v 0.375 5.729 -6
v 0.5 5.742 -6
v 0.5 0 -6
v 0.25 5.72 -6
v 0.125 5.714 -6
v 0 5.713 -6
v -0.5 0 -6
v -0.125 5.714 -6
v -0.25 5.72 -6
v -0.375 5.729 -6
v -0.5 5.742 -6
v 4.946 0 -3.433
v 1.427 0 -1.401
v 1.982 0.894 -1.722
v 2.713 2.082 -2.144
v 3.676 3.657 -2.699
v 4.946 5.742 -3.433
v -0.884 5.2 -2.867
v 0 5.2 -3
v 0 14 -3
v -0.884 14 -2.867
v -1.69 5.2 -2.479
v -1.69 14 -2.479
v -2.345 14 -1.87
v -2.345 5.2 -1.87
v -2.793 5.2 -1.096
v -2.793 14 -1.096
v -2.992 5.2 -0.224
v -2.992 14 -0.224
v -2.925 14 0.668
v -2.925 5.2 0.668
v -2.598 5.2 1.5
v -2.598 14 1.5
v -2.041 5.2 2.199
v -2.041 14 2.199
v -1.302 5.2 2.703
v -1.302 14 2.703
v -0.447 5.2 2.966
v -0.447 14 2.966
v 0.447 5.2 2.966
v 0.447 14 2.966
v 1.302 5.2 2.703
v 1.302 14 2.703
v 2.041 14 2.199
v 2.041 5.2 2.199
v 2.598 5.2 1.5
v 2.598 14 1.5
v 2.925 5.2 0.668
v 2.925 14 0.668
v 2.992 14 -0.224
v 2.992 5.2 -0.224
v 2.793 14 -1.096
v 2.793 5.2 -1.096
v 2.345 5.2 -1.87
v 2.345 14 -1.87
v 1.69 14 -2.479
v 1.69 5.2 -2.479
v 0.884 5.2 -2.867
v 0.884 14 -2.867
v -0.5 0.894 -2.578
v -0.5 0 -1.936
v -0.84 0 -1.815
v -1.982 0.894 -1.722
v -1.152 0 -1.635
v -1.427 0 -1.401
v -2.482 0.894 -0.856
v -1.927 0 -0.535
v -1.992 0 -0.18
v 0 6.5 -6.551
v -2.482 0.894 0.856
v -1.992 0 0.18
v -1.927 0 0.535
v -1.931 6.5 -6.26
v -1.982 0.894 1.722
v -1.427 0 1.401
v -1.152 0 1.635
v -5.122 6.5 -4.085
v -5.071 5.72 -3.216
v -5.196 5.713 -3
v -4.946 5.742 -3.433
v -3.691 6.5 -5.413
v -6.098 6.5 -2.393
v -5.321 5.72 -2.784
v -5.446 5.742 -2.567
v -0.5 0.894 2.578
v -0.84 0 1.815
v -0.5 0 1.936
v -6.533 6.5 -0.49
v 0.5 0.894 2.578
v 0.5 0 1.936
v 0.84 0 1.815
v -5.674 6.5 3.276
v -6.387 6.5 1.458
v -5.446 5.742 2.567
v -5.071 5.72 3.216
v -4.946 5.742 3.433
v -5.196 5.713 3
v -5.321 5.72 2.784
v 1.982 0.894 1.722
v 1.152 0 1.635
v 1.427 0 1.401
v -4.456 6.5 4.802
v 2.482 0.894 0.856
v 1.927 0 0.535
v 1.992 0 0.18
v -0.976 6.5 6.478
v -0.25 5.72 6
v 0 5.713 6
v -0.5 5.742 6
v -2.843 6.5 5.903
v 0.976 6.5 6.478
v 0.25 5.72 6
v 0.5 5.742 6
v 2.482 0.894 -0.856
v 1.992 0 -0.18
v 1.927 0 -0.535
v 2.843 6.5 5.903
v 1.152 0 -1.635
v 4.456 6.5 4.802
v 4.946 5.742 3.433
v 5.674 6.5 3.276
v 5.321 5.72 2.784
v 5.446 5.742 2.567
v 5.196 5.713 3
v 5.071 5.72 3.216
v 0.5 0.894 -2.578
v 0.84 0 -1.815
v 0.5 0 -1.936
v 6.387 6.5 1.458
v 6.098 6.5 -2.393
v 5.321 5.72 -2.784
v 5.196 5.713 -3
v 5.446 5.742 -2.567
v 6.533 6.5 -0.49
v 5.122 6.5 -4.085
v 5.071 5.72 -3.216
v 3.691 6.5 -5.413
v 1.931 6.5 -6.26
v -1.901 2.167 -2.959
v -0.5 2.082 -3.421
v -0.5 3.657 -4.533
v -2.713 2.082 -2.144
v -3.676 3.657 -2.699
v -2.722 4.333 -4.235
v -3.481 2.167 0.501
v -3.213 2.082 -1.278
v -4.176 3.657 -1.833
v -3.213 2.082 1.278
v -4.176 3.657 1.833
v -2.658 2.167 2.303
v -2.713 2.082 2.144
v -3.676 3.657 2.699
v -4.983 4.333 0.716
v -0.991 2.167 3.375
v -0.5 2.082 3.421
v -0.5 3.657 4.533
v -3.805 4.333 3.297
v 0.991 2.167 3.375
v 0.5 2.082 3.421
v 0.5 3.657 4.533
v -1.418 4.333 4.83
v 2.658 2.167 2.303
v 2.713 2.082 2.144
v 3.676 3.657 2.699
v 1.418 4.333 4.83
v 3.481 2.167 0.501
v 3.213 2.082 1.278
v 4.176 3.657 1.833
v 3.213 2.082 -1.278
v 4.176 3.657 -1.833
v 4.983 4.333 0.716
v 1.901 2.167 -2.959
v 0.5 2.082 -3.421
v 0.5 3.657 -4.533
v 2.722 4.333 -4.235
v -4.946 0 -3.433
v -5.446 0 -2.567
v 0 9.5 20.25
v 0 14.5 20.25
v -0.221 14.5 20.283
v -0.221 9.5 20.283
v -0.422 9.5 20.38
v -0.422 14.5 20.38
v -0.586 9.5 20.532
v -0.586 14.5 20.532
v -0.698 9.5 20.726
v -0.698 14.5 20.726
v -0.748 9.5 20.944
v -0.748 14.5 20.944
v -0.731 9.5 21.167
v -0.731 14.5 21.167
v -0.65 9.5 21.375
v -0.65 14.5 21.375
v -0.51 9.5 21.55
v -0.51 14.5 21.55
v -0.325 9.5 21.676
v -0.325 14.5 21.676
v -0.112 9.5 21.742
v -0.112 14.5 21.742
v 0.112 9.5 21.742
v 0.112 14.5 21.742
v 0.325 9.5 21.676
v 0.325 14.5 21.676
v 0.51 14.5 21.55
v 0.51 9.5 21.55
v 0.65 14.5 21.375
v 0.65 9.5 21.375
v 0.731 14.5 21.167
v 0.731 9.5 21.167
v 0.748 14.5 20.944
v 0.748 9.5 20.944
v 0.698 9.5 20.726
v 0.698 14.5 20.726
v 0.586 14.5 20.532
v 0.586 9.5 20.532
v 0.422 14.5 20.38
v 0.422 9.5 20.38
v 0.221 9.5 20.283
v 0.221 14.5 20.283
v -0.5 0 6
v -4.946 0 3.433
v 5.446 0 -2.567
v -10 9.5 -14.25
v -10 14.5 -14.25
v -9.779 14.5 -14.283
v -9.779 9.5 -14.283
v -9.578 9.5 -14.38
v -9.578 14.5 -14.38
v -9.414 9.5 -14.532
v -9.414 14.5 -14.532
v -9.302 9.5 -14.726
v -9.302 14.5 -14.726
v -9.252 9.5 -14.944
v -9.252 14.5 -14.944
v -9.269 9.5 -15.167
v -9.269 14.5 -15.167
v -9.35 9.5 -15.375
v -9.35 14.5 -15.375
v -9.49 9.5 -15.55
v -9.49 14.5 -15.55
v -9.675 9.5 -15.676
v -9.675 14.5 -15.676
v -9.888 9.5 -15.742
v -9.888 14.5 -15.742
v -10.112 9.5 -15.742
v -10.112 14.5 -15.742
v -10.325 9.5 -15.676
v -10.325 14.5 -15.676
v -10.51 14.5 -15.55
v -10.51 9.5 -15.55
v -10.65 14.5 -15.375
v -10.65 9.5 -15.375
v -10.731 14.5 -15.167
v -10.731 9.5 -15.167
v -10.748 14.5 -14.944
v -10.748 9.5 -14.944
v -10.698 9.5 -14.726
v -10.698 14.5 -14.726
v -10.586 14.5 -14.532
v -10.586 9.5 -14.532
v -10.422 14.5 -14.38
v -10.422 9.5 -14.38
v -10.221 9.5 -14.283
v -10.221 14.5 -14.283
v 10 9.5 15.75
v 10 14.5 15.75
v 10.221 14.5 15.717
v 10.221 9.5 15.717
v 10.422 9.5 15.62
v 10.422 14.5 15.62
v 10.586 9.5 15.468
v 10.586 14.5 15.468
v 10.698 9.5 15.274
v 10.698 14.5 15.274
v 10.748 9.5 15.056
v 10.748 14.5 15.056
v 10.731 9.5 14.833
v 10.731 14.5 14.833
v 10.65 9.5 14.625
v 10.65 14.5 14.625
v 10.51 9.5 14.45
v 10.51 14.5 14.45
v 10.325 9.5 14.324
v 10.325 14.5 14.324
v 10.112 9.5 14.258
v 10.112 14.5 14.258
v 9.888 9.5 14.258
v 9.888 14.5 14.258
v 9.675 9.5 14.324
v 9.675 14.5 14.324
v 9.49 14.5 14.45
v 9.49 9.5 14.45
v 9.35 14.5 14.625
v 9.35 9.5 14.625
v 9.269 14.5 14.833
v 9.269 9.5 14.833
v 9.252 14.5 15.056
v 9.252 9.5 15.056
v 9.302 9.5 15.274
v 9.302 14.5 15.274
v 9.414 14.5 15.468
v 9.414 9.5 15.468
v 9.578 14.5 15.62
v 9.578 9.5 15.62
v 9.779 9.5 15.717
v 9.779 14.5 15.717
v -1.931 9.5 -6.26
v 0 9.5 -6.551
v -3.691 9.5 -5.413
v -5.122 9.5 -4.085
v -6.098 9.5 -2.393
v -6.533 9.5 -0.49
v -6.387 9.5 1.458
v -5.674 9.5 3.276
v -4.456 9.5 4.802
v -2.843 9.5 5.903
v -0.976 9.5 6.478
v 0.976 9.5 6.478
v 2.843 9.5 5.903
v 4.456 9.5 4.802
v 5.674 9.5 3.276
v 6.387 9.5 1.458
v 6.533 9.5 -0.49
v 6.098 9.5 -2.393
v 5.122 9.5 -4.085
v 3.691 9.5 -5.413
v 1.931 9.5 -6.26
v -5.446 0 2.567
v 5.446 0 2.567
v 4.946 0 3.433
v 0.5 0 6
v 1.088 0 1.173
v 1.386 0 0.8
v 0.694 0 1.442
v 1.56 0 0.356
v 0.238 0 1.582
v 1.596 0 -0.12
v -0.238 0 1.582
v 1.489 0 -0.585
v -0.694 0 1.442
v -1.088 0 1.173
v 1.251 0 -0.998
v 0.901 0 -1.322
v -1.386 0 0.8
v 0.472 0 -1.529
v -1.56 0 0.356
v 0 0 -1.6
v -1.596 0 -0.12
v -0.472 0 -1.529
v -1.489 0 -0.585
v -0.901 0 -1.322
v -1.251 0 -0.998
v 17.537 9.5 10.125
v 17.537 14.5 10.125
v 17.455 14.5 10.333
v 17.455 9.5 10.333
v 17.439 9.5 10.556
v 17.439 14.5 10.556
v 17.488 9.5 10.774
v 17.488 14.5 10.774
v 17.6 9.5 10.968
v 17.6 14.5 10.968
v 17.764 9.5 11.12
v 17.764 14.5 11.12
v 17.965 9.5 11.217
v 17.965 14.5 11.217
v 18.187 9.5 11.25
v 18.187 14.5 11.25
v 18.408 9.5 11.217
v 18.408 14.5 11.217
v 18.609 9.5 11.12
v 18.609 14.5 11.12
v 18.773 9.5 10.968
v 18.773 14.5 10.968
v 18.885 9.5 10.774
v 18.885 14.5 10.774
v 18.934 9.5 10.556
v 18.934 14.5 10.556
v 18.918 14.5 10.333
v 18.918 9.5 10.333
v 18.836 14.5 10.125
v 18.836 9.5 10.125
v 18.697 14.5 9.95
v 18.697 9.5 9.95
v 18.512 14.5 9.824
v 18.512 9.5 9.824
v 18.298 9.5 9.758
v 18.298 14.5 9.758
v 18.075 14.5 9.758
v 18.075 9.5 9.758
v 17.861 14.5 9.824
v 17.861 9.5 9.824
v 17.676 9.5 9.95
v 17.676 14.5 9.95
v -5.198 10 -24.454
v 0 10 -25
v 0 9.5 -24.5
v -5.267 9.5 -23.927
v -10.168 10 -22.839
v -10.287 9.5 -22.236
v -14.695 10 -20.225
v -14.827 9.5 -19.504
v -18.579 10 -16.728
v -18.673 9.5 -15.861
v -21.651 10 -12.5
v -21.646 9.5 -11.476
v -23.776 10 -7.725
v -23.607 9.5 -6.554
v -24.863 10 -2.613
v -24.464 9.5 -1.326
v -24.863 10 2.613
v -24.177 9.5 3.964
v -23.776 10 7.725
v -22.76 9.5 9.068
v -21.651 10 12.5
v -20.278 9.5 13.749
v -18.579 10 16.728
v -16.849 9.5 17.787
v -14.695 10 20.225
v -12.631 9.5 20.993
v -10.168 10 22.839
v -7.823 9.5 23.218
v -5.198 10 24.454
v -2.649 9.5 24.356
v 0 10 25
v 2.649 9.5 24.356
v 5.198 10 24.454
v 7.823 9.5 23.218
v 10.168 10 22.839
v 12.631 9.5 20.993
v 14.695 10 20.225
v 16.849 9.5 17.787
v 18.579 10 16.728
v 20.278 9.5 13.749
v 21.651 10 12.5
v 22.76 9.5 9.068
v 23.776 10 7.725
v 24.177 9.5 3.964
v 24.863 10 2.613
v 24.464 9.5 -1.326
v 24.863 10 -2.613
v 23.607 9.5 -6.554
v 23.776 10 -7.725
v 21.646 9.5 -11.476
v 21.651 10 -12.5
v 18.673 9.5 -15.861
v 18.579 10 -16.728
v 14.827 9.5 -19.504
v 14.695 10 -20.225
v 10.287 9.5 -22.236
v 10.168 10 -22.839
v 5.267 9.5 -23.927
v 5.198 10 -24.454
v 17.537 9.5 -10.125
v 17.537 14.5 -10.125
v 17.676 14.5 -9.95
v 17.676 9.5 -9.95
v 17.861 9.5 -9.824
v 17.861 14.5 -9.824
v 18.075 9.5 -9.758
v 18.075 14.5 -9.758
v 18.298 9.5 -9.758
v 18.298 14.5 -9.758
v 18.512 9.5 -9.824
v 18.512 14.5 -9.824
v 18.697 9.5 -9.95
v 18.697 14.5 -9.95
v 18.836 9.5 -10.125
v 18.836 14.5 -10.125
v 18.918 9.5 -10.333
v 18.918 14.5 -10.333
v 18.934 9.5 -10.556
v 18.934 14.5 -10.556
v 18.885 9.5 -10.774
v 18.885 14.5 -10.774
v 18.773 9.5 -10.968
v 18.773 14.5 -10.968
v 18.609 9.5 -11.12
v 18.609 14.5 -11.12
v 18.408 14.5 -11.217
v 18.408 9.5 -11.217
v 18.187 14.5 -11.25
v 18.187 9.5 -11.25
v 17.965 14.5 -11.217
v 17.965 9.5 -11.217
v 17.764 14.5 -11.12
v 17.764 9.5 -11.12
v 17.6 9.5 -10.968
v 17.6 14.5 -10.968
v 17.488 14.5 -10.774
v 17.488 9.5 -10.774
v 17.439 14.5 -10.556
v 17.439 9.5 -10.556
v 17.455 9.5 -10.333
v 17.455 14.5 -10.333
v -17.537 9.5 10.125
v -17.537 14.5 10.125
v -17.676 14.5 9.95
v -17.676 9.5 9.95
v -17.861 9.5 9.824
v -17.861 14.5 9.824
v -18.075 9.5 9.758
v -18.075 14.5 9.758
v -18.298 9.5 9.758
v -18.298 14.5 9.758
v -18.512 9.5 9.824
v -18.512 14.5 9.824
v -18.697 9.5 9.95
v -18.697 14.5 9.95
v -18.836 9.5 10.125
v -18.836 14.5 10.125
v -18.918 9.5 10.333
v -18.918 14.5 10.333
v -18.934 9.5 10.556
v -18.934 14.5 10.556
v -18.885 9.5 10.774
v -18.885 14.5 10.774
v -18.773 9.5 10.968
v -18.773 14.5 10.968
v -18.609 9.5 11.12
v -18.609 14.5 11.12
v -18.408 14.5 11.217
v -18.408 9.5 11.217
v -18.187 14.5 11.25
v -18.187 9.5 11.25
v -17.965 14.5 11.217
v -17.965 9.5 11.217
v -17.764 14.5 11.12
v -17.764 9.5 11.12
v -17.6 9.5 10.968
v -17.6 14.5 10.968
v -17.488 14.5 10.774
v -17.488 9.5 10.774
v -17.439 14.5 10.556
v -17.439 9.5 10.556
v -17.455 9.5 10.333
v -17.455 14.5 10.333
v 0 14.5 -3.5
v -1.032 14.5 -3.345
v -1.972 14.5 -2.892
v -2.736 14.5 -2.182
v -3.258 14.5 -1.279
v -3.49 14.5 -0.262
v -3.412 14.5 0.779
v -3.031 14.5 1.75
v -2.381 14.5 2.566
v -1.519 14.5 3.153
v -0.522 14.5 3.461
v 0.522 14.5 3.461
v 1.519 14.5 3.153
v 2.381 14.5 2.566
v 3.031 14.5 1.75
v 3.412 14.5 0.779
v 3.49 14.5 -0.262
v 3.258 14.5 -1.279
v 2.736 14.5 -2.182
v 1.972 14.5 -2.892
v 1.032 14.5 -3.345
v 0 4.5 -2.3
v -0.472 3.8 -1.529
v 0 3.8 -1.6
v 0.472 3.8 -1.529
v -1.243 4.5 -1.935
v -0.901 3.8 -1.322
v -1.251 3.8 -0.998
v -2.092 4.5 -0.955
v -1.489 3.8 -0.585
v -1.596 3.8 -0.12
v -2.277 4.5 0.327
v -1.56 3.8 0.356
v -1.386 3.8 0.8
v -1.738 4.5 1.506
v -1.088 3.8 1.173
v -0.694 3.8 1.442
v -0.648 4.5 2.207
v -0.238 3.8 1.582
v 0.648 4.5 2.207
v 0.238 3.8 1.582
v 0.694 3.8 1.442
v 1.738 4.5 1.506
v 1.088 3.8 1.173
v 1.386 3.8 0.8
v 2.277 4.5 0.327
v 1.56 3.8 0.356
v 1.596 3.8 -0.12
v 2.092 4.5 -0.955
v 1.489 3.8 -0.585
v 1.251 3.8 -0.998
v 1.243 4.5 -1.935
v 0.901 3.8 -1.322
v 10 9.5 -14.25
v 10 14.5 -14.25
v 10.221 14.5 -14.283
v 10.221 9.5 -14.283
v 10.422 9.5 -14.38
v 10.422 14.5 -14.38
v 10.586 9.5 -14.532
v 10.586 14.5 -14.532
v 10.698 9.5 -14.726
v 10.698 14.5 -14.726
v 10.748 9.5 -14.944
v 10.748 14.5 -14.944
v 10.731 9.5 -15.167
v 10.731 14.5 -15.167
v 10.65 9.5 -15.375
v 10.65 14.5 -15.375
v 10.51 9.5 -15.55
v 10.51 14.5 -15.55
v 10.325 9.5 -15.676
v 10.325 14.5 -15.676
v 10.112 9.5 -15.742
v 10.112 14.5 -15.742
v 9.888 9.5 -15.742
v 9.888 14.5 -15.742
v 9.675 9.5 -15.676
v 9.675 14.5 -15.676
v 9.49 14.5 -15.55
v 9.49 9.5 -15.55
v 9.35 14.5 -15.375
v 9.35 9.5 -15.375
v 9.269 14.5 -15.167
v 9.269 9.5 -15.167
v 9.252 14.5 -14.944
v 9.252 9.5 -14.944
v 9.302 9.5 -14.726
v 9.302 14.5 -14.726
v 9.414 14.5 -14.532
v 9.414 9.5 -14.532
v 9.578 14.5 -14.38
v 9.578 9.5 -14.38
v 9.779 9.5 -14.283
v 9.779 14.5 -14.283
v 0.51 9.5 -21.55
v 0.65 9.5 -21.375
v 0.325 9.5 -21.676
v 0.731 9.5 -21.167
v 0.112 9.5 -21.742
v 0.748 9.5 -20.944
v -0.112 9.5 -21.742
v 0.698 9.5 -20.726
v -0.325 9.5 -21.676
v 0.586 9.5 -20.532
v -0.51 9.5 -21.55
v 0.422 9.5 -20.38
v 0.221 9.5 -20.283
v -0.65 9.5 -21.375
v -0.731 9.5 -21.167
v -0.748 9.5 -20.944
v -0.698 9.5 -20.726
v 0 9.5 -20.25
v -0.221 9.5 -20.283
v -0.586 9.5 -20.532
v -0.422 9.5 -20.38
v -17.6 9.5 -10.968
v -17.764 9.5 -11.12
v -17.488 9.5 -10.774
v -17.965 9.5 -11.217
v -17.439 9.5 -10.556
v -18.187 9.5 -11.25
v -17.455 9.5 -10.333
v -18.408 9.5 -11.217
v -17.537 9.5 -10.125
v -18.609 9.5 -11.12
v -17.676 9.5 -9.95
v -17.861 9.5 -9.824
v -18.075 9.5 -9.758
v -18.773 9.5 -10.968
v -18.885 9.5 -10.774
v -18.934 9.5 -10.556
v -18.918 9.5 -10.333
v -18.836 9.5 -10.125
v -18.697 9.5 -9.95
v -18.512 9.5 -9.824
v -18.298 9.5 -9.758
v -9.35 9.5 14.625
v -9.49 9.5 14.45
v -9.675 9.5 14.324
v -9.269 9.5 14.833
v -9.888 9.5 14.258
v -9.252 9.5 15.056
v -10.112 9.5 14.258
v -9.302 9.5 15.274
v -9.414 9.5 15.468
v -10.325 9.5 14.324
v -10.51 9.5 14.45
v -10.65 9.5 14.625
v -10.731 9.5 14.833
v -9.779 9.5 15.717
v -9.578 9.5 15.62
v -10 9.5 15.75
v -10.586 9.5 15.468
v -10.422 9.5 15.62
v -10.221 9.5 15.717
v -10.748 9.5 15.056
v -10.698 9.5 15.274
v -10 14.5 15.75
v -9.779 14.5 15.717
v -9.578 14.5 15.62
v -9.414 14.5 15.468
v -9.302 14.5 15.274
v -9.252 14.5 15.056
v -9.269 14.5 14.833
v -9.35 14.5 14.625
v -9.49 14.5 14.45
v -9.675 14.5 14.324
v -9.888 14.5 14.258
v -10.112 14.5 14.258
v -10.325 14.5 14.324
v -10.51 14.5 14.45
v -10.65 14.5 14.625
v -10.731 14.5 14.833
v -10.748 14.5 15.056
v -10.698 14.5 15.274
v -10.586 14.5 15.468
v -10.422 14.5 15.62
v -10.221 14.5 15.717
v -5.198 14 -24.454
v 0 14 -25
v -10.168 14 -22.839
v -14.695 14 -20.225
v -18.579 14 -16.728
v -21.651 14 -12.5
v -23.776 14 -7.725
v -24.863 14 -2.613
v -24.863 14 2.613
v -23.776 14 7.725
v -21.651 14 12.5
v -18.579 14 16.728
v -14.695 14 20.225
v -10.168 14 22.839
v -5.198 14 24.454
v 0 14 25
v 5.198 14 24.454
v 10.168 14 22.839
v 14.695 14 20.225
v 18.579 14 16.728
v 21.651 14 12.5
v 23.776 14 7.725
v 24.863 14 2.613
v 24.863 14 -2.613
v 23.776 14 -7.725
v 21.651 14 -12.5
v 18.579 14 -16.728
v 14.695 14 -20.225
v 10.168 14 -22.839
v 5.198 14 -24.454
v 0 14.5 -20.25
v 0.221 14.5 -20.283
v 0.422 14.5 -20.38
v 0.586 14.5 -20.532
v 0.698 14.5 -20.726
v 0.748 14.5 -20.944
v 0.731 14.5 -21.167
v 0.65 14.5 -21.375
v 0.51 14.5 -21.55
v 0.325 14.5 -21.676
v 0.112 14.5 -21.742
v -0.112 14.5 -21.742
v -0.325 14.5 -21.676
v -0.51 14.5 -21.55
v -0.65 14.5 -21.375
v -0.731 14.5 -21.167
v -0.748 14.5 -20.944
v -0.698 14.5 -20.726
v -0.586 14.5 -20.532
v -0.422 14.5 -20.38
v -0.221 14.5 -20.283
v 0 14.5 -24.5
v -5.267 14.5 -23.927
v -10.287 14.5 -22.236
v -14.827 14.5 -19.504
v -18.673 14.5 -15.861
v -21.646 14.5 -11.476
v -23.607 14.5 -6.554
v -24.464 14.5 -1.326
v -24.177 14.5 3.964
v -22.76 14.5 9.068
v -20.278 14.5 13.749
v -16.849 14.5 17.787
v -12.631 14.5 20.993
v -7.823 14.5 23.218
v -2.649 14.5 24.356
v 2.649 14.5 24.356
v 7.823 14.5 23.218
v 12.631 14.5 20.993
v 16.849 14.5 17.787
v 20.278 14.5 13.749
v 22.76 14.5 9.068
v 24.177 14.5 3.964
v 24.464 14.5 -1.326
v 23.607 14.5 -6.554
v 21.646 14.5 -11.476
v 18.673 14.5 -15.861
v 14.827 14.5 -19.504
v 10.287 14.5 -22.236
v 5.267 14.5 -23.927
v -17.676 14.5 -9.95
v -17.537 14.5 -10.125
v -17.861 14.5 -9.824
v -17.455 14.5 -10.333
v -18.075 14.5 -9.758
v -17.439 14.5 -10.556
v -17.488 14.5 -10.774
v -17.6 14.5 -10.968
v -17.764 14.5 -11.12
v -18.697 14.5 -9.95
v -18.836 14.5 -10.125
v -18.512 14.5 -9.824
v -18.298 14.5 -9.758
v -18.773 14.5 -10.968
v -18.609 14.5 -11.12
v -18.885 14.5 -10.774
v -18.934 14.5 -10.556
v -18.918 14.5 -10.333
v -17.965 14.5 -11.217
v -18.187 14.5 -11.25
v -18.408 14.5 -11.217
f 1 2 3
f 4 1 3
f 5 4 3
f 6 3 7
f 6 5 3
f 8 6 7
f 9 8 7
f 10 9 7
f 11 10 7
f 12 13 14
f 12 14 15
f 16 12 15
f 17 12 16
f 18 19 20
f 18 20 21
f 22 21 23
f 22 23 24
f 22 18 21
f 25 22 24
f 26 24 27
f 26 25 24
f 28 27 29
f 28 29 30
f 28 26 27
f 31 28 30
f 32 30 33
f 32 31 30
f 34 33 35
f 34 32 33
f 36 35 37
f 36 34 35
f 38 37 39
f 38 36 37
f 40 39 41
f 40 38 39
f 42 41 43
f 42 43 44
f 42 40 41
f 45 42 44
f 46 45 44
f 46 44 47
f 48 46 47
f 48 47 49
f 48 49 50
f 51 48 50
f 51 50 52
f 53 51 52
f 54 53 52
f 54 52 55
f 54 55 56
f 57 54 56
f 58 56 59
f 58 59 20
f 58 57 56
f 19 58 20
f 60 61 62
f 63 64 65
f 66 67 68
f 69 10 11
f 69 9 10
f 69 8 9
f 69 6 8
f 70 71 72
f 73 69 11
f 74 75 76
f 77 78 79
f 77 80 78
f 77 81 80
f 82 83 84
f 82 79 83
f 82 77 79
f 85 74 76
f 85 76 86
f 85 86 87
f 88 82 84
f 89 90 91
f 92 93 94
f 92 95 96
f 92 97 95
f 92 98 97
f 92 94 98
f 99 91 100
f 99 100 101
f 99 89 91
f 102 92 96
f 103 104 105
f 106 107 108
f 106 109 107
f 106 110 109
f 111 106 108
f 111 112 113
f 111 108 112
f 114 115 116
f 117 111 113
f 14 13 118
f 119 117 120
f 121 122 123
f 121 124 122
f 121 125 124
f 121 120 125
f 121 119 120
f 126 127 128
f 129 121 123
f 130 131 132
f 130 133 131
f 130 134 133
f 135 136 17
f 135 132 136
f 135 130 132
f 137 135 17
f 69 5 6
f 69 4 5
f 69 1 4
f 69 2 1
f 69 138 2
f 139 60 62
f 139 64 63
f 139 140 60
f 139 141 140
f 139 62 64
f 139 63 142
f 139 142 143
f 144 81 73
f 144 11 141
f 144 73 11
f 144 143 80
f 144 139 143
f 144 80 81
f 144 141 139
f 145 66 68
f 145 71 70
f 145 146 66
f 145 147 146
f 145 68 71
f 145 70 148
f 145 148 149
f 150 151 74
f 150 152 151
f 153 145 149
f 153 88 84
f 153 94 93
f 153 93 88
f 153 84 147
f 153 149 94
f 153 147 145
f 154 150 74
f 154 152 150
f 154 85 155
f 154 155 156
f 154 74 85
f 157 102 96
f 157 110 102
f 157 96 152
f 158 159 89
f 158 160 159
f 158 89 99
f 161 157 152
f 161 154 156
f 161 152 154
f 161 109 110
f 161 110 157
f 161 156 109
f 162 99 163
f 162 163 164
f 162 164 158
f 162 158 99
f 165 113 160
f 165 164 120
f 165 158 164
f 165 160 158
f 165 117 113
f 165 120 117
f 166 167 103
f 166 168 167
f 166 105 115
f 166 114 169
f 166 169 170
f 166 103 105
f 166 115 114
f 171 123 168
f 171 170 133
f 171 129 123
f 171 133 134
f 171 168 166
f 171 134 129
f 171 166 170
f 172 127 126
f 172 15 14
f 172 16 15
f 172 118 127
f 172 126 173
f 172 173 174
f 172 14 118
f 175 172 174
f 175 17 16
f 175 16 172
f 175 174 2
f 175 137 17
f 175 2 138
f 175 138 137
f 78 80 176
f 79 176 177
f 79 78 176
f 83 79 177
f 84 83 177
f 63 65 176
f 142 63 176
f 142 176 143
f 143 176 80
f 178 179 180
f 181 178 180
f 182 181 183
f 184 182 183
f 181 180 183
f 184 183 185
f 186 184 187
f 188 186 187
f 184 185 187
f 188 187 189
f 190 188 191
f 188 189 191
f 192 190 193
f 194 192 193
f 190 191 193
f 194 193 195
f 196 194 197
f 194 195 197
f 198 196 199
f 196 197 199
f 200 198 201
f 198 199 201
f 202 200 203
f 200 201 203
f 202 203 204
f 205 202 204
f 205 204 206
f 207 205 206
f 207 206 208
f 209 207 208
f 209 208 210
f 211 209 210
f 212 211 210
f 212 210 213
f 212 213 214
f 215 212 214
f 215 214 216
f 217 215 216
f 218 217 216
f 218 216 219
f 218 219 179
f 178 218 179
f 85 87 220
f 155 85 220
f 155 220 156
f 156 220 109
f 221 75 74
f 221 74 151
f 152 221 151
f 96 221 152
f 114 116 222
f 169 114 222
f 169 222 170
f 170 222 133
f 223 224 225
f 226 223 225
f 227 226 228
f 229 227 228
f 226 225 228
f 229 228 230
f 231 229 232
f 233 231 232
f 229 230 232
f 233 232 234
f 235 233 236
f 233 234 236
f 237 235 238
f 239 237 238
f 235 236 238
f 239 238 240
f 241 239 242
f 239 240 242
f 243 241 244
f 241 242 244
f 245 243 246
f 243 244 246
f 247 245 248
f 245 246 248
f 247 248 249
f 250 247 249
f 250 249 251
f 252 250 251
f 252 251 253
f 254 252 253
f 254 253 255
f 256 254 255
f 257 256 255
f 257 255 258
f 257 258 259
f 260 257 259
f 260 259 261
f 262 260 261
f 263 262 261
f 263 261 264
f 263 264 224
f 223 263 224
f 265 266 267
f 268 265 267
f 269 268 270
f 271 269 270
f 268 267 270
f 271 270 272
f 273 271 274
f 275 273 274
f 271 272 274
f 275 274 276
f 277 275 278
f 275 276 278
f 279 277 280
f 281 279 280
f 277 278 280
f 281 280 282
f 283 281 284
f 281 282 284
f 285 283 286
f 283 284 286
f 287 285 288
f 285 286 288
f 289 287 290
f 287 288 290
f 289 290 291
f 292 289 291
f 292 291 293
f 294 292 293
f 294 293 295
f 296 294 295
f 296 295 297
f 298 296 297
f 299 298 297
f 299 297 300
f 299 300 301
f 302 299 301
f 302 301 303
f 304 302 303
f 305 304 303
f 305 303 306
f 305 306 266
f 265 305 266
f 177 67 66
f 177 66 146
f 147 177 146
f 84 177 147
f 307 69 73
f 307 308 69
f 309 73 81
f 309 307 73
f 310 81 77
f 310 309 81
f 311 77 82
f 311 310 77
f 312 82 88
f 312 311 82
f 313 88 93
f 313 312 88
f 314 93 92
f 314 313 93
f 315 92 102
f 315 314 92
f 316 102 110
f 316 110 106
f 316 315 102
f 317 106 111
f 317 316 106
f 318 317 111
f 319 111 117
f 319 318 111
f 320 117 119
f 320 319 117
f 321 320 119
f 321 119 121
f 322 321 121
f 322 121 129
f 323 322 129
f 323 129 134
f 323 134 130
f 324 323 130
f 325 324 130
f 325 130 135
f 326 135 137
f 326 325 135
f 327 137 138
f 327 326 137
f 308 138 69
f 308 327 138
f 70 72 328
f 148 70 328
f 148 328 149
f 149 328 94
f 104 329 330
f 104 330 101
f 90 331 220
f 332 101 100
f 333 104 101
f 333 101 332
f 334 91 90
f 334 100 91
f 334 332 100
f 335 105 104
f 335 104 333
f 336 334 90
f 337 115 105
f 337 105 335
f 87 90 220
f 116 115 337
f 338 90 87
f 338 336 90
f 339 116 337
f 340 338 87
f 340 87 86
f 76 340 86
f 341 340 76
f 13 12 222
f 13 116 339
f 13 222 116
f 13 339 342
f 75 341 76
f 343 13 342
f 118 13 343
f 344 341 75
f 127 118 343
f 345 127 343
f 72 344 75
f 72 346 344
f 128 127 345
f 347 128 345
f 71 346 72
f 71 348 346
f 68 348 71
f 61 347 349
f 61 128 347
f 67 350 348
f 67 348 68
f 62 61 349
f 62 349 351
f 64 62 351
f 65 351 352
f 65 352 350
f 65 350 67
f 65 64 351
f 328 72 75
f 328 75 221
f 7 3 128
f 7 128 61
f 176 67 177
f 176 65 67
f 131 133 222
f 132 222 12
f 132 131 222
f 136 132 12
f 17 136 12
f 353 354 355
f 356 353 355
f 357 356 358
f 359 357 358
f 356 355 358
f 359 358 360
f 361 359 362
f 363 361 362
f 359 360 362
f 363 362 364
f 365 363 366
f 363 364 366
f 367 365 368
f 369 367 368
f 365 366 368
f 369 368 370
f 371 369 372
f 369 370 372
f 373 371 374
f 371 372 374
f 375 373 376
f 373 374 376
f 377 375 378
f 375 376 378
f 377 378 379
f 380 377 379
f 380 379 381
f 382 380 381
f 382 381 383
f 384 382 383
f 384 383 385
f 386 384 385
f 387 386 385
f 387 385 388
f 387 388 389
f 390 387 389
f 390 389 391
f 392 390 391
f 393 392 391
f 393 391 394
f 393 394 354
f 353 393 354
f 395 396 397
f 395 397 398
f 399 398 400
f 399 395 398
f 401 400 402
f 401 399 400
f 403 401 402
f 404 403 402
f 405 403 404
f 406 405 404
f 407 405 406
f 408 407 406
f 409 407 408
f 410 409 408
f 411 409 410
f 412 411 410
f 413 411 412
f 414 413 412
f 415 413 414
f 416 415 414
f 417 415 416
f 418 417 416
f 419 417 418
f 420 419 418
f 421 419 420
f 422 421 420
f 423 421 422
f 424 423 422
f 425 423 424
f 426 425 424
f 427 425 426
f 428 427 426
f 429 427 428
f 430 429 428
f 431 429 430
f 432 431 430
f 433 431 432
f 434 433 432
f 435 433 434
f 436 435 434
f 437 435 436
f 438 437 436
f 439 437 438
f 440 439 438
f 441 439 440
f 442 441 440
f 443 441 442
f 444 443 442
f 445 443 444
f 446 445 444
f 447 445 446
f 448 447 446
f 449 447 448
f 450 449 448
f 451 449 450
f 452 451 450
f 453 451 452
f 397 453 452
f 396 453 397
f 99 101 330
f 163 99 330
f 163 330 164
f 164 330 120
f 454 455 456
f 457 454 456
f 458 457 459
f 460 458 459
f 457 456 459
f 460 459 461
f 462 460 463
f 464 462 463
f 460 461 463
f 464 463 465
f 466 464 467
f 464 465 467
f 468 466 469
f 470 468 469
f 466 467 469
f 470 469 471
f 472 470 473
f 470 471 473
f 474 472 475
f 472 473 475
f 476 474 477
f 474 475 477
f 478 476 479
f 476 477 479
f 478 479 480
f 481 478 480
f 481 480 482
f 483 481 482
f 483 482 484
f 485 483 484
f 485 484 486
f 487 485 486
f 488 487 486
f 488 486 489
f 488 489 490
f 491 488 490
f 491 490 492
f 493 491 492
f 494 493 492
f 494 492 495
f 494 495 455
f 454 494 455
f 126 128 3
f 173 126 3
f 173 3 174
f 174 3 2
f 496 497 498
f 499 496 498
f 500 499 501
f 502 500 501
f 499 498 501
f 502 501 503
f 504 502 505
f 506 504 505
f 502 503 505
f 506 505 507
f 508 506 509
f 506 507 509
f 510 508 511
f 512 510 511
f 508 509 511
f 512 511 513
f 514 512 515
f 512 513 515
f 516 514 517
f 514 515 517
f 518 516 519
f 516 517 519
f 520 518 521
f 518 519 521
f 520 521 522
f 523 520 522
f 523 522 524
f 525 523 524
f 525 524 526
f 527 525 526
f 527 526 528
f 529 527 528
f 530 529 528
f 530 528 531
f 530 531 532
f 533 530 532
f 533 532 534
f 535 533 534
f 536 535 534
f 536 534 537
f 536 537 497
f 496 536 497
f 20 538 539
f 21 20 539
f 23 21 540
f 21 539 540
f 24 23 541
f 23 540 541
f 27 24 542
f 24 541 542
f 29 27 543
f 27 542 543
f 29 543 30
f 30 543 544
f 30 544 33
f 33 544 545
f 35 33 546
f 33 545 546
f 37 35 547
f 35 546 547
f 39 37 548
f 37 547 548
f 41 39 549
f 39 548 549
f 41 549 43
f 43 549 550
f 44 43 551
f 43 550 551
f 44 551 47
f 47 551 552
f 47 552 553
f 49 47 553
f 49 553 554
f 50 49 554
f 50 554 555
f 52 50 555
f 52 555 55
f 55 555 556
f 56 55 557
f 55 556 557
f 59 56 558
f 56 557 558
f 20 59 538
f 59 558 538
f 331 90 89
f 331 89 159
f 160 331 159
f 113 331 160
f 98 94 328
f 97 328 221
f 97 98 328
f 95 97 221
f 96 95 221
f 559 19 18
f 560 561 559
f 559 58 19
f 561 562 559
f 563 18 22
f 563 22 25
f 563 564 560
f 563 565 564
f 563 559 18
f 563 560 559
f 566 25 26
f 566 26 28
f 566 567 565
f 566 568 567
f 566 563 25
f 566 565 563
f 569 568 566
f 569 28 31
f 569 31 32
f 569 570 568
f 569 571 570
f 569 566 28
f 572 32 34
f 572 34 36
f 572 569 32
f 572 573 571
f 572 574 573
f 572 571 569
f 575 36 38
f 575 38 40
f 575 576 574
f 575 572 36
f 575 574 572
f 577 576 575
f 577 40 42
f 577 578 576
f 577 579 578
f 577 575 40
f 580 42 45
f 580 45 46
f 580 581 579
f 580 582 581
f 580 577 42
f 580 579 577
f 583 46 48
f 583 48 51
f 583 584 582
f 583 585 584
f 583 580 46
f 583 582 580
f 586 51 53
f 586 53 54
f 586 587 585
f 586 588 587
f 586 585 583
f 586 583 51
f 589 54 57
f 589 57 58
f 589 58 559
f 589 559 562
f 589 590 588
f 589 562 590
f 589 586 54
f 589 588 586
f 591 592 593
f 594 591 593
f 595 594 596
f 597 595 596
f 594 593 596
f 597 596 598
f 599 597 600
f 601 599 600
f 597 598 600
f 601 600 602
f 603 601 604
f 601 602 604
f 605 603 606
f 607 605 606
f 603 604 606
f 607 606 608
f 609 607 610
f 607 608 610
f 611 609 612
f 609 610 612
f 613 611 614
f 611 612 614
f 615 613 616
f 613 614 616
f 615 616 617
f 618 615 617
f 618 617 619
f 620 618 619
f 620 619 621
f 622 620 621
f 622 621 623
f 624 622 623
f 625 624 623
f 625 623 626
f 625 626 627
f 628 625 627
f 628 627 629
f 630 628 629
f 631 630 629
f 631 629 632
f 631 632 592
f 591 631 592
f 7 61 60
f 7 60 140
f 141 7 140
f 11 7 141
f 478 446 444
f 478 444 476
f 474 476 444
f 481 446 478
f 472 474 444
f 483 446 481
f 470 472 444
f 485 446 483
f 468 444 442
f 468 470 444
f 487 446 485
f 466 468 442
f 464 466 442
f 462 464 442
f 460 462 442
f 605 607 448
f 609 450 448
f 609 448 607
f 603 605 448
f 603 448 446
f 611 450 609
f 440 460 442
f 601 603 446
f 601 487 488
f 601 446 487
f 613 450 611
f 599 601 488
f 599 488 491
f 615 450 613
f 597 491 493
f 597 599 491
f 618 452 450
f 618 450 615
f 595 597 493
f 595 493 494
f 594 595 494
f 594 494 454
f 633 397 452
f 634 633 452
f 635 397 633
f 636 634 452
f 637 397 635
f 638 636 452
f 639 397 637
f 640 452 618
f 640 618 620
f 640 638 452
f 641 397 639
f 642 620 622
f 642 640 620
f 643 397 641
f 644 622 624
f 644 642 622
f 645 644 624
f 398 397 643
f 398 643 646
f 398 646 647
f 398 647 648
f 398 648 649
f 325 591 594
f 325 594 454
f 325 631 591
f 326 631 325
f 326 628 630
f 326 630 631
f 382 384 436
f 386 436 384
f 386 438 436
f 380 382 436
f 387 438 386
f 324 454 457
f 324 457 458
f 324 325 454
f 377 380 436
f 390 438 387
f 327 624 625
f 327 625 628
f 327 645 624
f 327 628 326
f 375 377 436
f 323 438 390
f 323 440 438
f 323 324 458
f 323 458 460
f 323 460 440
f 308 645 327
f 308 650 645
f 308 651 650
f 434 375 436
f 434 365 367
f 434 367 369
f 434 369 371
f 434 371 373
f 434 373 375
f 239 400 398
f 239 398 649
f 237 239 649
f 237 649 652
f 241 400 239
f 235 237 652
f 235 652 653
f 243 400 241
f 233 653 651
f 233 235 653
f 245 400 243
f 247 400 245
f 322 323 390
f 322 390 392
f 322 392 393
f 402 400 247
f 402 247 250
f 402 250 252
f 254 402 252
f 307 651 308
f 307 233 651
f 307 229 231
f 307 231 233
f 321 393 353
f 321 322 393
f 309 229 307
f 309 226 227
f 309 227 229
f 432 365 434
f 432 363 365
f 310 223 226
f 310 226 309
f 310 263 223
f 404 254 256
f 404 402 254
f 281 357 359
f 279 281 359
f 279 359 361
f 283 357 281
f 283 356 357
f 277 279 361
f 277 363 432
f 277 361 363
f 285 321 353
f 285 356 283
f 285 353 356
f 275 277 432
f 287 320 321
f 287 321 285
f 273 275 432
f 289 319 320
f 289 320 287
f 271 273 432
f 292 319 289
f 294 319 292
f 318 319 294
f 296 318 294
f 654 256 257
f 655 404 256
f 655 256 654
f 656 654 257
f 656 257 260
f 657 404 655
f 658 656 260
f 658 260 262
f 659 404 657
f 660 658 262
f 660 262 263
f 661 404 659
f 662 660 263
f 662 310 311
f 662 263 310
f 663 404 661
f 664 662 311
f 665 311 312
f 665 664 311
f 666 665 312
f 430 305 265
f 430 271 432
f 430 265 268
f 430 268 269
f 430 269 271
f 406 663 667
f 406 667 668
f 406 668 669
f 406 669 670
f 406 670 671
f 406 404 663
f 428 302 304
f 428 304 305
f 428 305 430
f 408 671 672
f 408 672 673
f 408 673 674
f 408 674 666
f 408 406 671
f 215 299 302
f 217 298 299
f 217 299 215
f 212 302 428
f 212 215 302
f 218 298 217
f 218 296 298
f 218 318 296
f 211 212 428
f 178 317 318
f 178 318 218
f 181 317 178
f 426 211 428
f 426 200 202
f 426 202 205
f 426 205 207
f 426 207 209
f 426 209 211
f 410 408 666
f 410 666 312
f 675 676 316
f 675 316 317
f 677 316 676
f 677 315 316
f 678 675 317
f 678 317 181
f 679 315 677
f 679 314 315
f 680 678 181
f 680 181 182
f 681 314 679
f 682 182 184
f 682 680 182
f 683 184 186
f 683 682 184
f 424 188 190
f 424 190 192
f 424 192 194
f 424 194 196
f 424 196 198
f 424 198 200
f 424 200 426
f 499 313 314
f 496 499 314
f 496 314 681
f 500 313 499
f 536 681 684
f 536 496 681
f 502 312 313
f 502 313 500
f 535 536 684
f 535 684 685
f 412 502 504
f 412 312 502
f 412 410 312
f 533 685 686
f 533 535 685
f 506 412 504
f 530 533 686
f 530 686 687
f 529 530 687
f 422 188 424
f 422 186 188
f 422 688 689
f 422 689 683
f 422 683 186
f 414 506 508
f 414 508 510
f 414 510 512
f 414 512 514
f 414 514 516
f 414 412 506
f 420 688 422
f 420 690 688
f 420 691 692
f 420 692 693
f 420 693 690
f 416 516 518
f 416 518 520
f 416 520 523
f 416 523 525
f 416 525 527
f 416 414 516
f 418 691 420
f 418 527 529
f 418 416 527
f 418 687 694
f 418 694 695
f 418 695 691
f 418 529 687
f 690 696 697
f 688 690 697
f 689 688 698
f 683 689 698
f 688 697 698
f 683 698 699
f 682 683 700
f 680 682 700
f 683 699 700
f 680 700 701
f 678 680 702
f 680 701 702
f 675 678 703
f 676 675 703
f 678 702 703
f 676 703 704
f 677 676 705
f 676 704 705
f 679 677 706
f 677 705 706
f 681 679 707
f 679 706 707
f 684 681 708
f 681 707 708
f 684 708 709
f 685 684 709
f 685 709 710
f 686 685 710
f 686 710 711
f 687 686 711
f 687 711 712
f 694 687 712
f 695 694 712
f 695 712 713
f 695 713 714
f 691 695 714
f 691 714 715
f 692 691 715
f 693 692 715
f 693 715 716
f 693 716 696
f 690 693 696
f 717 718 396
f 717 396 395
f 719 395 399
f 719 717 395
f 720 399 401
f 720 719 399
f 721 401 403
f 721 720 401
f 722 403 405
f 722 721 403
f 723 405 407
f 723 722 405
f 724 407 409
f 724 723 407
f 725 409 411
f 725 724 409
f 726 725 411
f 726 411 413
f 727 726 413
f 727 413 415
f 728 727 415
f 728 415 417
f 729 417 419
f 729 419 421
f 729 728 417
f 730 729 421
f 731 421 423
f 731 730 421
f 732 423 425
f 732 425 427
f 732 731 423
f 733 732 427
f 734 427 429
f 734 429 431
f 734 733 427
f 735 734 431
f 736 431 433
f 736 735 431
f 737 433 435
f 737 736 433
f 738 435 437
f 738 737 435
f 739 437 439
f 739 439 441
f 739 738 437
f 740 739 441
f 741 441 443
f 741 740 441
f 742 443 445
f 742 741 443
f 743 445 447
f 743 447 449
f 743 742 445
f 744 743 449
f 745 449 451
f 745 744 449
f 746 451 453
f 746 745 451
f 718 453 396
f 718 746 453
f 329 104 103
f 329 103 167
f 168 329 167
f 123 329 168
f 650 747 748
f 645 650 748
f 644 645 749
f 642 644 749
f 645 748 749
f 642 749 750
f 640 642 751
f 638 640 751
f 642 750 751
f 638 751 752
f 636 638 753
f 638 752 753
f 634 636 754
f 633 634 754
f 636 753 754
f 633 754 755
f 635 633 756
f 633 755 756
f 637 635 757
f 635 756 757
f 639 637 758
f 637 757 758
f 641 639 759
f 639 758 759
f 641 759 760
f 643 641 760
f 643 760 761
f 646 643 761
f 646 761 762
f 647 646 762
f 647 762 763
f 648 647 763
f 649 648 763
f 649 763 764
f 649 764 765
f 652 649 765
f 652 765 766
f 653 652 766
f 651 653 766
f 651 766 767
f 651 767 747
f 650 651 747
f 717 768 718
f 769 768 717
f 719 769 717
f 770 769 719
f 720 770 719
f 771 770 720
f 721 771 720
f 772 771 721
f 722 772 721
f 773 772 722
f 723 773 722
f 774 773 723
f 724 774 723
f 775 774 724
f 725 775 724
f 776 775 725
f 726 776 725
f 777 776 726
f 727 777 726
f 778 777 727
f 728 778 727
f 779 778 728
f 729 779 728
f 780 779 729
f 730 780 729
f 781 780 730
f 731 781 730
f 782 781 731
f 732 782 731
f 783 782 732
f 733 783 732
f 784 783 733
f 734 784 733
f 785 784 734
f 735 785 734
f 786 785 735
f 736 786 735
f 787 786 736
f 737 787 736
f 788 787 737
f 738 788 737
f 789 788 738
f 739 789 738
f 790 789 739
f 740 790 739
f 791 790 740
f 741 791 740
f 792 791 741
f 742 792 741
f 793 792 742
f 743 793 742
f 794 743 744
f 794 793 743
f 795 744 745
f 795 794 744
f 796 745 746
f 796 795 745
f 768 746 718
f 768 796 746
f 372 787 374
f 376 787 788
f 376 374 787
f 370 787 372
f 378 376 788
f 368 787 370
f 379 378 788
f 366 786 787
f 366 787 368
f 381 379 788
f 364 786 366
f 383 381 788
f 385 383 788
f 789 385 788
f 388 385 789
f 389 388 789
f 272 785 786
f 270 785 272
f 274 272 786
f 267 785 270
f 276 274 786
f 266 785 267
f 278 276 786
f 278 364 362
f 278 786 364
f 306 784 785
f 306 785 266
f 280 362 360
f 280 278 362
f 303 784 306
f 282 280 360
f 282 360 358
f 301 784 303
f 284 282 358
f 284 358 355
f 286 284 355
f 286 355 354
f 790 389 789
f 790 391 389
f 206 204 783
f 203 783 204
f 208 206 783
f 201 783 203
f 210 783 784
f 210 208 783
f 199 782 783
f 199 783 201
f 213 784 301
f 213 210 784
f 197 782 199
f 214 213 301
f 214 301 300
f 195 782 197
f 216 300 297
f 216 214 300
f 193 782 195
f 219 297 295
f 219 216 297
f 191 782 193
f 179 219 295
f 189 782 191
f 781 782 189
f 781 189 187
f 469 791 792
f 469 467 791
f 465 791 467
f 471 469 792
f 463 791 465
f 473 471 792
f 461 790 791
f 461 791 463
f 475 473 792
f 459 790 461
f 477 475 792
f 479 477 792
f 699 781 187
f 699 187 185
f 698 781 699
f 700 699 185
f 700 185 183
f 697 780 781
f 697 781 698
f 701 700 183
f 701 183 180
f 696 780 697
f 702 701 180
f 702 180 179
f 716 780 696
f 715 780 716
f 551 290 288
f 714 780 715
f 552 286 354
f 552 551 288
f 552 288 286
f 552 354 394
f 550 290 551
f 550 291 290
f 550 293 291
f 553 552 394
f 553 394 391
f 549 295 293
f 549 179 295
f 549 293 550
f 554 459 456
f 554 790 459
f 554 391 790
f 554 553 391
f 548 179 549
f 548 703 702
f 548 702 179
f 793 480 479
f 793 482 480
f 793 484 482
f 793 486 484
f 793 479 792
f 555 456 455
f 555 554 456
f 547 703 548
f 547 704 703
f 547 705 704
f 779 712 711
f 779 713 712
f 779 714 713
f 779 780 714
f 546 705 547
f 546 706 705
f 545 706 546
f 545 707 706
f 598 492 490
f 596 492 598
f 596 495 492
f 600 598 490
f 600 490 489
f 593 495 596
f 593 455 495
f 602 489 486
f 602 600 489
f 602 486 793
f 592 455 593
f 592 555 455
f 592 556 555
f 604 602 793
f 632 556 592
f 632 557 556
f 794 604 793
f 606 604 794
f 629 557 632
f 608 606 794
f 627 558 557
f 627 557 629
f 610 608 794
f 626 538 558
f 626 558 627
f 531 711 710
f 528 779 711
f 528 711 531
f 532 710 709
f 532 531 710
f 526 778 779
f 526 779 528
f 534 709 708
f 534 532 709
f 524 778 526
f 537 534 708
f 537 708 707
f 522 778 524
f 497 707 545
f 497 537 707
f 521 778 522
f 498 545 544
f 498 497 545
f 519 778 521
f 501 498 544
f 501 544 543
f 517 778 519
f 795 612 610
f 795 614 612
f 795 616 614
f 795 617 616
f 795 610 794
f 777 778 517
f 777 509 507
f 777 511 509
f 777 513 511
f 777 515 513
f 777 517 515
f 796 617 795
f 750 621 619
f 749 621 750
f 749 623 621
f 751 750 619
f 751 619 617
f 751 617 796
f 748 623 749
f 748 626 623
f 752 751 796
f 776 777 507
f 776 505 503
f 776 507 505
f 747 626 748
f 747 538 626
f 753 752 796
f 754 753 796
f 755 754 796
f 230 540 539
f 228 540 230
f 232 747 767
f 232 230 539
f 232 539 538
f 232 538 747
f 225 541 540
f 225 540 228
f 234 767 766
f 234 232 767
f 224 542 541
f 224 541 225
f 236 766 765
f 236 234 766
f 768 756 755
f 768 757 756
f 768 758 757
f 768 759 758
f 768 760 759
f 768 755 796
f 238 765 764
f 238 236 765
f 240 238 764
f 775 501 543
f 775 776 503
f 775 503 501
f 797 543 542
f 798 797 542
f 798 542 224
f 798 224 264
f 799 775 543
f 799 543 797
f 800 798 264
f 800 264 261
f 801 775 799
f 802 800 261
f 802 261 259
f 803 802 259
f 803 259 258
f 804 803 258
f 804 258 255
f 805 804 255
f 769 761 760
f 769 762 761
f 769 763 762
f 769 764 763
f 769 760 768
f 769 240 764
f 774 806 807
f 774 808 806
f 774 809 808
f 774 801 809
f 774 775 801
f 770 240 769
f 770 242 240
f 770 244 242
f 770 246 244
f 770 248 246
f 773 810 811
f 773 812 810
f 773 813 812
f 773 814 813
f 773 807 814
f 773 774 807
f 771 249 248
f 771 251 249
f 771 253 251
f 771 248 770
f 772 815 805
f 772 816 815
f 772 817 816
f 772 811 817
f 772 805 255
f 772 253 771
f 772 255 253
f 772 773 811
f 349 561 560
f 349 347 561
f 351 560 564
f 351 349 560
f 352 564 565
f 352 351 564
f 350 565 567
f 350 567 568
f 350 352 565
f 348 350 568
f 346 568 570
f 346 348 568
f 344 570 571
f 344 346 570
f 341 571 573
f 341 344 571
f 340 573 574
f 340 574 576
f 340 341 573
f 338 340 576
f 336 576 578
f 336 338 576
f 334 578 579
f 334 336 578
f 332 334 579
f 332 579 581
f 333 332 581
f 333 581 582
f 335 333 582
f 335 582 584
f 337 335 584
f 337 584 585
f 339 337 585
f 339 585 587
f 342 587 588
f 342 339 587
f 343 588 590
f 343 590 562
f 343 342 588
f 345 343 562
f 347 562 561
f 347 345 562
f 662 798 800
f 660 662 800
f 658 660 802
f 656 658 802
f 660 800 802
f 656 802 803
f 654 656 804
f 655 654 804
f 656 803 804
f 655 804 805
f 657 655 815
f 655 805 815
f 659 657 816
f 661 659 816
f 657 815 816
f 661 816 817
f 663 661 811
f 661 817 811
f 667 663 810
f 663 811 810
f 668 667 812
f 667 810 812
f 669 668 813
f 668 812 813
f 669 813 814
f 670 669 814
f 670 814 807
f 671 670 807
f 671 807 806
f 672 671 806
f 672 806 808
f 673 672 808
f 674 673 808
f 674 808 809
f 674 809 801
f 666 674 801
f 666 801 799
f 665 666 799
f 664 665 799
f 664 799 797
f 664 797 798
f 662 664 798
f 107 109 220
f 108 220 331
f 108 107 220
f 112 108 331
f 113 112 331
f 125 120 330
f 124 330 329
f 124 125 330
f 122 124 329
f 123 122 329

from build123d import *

# Parameters (mm, degrees)
BOSS_EXTRUDE2_REACH = 44.382
SKETCH3_W           = 1
SKETCH3_H           = 6.5
CIRPATTERN1_COUNT   = 6
SKETCH5_R           = 0.75
CUT_EXTRUDE1_DEPTH  = 39.213217609
CIRPATTERN2_COUNT   = 6
SKETCH6_R           = 0.75
CUT_EXTRUDE2_DEPTH  = 39.213217609
CHAMFER1_SIZE       = 0.5


with BuildPart() as part:
    # Sketch1 → Revolve1 (revolve)
    with BuildSketch(Plane.XY, mode=Mode.PRIVATE) as revolve1_sk:
        Polygon((1.6, 0), (2, 0), (6.551348998, 6.5), (6.551348998, 9.5), (25, 9.5), (25, 14.5), (3, 14.5), (3, 5.2), (1.6, 3.8), align=None)
    revolve(revolve1_sk.sketch.rotate(Axis((0, 0, 0), (0, 1, 0)), 90), axis=Axis((0, 0, 0), (0, 1, 0)))

    # Sketch3 → Boss-Extrude2 (add, up to next)
    with BuildSketch(Plane.XY.offset(6), mode=Mode.PRIVATE) as boss_extrude2_sk1:
        with Locations((0, 3.25)):
            Rectangle(SKETCH3_W, SKETCH3_H)
    boss_extrude2_tool1 = extrude(boss_extrude2_sk1.sketch, amount=-BOSS_EXTRUDE2_REACH, mode=Mode.PRIVATE) - part.part
    boss_extrude2 = boss_extrude2_tool1.solids().sort_by_distance((0, 3.25, 6))[0]
    add(boss_extrude2)

    # CirPattern1: Boss-Extrude2 ×6 about axis
    cirpattern1_axis = Axis((0, 0, 0), (0, 1, 0))
    for i in range(1, CIRPATTERN1_COUNT):
        add(boss_extrude2.rotate(cirpattern1_axis, i * 360 / CIRPATTERN1_COUNT))

    # Sketch5 → Cut-Extrude1 (cut, through all)
    with BuildSketch(Plane(origin=(0, 14.5, 0), x_dir=(1, 0, 0), z_dir=(0, 1, 0))):
        with Locations(Location((0, 21, 0), (0, 0, 270))):
            Circle(SKETCH5_R)
    cut_extrude1 = extrude(amount=-CUT_EXTRUDE1_DEPTH, mode=Mode.SUBTRACT)

    # CirPattern2: Cut-Extrude1 ×6 about axis
    cirpattern2_axis = Axis((0, 0, 0), (0, 1, 0))
    for i in range(1, CIRPATTERN2_COUNT):
        add(cut_extrude1.rotate(cirpattern2_axis, i * 360 / CIRPATTERN2_COUNT), mode=Mode.SUBTRACT)

    # Sketch6 → Cut-Extrude2 (cut, through all)
    with BuildSketch(Plane(origin=(0, 14.5, 0), x_dir=(1, 0, 0), z_dir=(0, 1, 0))):
        with Locations(Location((-10, 15, 0), (0, 0, 270))):
            Circle(SKETCH6_R)
        with Locations(Location((10, 15, 0), (0, 0, 270))):
            Circle(SKETCH6_R)
        with Locations(Location((-10, -15, 0), (0, 0, 270))):
            Circle(SKETCH6_R)
        with Locations(Location((10, -15, 0), (0, 0, 270))):
            Circle(SKETCH6_R)
    extrude(amount=-CUT_EXTRUDE2_DEPTH, mode=Mode.SUBTRACT)

    # Chamfer1
    chamfer1_edges = [part.edges().sort_by_distance(p)[0] for p in [
        (0, 14.5, 3),
        (0, 14.5, 25),
        (0, 9.5, 25),
    ]]
    chamfer(chamfer1_edges, length=CHAMFER1_SIZE)


solid = part.part
